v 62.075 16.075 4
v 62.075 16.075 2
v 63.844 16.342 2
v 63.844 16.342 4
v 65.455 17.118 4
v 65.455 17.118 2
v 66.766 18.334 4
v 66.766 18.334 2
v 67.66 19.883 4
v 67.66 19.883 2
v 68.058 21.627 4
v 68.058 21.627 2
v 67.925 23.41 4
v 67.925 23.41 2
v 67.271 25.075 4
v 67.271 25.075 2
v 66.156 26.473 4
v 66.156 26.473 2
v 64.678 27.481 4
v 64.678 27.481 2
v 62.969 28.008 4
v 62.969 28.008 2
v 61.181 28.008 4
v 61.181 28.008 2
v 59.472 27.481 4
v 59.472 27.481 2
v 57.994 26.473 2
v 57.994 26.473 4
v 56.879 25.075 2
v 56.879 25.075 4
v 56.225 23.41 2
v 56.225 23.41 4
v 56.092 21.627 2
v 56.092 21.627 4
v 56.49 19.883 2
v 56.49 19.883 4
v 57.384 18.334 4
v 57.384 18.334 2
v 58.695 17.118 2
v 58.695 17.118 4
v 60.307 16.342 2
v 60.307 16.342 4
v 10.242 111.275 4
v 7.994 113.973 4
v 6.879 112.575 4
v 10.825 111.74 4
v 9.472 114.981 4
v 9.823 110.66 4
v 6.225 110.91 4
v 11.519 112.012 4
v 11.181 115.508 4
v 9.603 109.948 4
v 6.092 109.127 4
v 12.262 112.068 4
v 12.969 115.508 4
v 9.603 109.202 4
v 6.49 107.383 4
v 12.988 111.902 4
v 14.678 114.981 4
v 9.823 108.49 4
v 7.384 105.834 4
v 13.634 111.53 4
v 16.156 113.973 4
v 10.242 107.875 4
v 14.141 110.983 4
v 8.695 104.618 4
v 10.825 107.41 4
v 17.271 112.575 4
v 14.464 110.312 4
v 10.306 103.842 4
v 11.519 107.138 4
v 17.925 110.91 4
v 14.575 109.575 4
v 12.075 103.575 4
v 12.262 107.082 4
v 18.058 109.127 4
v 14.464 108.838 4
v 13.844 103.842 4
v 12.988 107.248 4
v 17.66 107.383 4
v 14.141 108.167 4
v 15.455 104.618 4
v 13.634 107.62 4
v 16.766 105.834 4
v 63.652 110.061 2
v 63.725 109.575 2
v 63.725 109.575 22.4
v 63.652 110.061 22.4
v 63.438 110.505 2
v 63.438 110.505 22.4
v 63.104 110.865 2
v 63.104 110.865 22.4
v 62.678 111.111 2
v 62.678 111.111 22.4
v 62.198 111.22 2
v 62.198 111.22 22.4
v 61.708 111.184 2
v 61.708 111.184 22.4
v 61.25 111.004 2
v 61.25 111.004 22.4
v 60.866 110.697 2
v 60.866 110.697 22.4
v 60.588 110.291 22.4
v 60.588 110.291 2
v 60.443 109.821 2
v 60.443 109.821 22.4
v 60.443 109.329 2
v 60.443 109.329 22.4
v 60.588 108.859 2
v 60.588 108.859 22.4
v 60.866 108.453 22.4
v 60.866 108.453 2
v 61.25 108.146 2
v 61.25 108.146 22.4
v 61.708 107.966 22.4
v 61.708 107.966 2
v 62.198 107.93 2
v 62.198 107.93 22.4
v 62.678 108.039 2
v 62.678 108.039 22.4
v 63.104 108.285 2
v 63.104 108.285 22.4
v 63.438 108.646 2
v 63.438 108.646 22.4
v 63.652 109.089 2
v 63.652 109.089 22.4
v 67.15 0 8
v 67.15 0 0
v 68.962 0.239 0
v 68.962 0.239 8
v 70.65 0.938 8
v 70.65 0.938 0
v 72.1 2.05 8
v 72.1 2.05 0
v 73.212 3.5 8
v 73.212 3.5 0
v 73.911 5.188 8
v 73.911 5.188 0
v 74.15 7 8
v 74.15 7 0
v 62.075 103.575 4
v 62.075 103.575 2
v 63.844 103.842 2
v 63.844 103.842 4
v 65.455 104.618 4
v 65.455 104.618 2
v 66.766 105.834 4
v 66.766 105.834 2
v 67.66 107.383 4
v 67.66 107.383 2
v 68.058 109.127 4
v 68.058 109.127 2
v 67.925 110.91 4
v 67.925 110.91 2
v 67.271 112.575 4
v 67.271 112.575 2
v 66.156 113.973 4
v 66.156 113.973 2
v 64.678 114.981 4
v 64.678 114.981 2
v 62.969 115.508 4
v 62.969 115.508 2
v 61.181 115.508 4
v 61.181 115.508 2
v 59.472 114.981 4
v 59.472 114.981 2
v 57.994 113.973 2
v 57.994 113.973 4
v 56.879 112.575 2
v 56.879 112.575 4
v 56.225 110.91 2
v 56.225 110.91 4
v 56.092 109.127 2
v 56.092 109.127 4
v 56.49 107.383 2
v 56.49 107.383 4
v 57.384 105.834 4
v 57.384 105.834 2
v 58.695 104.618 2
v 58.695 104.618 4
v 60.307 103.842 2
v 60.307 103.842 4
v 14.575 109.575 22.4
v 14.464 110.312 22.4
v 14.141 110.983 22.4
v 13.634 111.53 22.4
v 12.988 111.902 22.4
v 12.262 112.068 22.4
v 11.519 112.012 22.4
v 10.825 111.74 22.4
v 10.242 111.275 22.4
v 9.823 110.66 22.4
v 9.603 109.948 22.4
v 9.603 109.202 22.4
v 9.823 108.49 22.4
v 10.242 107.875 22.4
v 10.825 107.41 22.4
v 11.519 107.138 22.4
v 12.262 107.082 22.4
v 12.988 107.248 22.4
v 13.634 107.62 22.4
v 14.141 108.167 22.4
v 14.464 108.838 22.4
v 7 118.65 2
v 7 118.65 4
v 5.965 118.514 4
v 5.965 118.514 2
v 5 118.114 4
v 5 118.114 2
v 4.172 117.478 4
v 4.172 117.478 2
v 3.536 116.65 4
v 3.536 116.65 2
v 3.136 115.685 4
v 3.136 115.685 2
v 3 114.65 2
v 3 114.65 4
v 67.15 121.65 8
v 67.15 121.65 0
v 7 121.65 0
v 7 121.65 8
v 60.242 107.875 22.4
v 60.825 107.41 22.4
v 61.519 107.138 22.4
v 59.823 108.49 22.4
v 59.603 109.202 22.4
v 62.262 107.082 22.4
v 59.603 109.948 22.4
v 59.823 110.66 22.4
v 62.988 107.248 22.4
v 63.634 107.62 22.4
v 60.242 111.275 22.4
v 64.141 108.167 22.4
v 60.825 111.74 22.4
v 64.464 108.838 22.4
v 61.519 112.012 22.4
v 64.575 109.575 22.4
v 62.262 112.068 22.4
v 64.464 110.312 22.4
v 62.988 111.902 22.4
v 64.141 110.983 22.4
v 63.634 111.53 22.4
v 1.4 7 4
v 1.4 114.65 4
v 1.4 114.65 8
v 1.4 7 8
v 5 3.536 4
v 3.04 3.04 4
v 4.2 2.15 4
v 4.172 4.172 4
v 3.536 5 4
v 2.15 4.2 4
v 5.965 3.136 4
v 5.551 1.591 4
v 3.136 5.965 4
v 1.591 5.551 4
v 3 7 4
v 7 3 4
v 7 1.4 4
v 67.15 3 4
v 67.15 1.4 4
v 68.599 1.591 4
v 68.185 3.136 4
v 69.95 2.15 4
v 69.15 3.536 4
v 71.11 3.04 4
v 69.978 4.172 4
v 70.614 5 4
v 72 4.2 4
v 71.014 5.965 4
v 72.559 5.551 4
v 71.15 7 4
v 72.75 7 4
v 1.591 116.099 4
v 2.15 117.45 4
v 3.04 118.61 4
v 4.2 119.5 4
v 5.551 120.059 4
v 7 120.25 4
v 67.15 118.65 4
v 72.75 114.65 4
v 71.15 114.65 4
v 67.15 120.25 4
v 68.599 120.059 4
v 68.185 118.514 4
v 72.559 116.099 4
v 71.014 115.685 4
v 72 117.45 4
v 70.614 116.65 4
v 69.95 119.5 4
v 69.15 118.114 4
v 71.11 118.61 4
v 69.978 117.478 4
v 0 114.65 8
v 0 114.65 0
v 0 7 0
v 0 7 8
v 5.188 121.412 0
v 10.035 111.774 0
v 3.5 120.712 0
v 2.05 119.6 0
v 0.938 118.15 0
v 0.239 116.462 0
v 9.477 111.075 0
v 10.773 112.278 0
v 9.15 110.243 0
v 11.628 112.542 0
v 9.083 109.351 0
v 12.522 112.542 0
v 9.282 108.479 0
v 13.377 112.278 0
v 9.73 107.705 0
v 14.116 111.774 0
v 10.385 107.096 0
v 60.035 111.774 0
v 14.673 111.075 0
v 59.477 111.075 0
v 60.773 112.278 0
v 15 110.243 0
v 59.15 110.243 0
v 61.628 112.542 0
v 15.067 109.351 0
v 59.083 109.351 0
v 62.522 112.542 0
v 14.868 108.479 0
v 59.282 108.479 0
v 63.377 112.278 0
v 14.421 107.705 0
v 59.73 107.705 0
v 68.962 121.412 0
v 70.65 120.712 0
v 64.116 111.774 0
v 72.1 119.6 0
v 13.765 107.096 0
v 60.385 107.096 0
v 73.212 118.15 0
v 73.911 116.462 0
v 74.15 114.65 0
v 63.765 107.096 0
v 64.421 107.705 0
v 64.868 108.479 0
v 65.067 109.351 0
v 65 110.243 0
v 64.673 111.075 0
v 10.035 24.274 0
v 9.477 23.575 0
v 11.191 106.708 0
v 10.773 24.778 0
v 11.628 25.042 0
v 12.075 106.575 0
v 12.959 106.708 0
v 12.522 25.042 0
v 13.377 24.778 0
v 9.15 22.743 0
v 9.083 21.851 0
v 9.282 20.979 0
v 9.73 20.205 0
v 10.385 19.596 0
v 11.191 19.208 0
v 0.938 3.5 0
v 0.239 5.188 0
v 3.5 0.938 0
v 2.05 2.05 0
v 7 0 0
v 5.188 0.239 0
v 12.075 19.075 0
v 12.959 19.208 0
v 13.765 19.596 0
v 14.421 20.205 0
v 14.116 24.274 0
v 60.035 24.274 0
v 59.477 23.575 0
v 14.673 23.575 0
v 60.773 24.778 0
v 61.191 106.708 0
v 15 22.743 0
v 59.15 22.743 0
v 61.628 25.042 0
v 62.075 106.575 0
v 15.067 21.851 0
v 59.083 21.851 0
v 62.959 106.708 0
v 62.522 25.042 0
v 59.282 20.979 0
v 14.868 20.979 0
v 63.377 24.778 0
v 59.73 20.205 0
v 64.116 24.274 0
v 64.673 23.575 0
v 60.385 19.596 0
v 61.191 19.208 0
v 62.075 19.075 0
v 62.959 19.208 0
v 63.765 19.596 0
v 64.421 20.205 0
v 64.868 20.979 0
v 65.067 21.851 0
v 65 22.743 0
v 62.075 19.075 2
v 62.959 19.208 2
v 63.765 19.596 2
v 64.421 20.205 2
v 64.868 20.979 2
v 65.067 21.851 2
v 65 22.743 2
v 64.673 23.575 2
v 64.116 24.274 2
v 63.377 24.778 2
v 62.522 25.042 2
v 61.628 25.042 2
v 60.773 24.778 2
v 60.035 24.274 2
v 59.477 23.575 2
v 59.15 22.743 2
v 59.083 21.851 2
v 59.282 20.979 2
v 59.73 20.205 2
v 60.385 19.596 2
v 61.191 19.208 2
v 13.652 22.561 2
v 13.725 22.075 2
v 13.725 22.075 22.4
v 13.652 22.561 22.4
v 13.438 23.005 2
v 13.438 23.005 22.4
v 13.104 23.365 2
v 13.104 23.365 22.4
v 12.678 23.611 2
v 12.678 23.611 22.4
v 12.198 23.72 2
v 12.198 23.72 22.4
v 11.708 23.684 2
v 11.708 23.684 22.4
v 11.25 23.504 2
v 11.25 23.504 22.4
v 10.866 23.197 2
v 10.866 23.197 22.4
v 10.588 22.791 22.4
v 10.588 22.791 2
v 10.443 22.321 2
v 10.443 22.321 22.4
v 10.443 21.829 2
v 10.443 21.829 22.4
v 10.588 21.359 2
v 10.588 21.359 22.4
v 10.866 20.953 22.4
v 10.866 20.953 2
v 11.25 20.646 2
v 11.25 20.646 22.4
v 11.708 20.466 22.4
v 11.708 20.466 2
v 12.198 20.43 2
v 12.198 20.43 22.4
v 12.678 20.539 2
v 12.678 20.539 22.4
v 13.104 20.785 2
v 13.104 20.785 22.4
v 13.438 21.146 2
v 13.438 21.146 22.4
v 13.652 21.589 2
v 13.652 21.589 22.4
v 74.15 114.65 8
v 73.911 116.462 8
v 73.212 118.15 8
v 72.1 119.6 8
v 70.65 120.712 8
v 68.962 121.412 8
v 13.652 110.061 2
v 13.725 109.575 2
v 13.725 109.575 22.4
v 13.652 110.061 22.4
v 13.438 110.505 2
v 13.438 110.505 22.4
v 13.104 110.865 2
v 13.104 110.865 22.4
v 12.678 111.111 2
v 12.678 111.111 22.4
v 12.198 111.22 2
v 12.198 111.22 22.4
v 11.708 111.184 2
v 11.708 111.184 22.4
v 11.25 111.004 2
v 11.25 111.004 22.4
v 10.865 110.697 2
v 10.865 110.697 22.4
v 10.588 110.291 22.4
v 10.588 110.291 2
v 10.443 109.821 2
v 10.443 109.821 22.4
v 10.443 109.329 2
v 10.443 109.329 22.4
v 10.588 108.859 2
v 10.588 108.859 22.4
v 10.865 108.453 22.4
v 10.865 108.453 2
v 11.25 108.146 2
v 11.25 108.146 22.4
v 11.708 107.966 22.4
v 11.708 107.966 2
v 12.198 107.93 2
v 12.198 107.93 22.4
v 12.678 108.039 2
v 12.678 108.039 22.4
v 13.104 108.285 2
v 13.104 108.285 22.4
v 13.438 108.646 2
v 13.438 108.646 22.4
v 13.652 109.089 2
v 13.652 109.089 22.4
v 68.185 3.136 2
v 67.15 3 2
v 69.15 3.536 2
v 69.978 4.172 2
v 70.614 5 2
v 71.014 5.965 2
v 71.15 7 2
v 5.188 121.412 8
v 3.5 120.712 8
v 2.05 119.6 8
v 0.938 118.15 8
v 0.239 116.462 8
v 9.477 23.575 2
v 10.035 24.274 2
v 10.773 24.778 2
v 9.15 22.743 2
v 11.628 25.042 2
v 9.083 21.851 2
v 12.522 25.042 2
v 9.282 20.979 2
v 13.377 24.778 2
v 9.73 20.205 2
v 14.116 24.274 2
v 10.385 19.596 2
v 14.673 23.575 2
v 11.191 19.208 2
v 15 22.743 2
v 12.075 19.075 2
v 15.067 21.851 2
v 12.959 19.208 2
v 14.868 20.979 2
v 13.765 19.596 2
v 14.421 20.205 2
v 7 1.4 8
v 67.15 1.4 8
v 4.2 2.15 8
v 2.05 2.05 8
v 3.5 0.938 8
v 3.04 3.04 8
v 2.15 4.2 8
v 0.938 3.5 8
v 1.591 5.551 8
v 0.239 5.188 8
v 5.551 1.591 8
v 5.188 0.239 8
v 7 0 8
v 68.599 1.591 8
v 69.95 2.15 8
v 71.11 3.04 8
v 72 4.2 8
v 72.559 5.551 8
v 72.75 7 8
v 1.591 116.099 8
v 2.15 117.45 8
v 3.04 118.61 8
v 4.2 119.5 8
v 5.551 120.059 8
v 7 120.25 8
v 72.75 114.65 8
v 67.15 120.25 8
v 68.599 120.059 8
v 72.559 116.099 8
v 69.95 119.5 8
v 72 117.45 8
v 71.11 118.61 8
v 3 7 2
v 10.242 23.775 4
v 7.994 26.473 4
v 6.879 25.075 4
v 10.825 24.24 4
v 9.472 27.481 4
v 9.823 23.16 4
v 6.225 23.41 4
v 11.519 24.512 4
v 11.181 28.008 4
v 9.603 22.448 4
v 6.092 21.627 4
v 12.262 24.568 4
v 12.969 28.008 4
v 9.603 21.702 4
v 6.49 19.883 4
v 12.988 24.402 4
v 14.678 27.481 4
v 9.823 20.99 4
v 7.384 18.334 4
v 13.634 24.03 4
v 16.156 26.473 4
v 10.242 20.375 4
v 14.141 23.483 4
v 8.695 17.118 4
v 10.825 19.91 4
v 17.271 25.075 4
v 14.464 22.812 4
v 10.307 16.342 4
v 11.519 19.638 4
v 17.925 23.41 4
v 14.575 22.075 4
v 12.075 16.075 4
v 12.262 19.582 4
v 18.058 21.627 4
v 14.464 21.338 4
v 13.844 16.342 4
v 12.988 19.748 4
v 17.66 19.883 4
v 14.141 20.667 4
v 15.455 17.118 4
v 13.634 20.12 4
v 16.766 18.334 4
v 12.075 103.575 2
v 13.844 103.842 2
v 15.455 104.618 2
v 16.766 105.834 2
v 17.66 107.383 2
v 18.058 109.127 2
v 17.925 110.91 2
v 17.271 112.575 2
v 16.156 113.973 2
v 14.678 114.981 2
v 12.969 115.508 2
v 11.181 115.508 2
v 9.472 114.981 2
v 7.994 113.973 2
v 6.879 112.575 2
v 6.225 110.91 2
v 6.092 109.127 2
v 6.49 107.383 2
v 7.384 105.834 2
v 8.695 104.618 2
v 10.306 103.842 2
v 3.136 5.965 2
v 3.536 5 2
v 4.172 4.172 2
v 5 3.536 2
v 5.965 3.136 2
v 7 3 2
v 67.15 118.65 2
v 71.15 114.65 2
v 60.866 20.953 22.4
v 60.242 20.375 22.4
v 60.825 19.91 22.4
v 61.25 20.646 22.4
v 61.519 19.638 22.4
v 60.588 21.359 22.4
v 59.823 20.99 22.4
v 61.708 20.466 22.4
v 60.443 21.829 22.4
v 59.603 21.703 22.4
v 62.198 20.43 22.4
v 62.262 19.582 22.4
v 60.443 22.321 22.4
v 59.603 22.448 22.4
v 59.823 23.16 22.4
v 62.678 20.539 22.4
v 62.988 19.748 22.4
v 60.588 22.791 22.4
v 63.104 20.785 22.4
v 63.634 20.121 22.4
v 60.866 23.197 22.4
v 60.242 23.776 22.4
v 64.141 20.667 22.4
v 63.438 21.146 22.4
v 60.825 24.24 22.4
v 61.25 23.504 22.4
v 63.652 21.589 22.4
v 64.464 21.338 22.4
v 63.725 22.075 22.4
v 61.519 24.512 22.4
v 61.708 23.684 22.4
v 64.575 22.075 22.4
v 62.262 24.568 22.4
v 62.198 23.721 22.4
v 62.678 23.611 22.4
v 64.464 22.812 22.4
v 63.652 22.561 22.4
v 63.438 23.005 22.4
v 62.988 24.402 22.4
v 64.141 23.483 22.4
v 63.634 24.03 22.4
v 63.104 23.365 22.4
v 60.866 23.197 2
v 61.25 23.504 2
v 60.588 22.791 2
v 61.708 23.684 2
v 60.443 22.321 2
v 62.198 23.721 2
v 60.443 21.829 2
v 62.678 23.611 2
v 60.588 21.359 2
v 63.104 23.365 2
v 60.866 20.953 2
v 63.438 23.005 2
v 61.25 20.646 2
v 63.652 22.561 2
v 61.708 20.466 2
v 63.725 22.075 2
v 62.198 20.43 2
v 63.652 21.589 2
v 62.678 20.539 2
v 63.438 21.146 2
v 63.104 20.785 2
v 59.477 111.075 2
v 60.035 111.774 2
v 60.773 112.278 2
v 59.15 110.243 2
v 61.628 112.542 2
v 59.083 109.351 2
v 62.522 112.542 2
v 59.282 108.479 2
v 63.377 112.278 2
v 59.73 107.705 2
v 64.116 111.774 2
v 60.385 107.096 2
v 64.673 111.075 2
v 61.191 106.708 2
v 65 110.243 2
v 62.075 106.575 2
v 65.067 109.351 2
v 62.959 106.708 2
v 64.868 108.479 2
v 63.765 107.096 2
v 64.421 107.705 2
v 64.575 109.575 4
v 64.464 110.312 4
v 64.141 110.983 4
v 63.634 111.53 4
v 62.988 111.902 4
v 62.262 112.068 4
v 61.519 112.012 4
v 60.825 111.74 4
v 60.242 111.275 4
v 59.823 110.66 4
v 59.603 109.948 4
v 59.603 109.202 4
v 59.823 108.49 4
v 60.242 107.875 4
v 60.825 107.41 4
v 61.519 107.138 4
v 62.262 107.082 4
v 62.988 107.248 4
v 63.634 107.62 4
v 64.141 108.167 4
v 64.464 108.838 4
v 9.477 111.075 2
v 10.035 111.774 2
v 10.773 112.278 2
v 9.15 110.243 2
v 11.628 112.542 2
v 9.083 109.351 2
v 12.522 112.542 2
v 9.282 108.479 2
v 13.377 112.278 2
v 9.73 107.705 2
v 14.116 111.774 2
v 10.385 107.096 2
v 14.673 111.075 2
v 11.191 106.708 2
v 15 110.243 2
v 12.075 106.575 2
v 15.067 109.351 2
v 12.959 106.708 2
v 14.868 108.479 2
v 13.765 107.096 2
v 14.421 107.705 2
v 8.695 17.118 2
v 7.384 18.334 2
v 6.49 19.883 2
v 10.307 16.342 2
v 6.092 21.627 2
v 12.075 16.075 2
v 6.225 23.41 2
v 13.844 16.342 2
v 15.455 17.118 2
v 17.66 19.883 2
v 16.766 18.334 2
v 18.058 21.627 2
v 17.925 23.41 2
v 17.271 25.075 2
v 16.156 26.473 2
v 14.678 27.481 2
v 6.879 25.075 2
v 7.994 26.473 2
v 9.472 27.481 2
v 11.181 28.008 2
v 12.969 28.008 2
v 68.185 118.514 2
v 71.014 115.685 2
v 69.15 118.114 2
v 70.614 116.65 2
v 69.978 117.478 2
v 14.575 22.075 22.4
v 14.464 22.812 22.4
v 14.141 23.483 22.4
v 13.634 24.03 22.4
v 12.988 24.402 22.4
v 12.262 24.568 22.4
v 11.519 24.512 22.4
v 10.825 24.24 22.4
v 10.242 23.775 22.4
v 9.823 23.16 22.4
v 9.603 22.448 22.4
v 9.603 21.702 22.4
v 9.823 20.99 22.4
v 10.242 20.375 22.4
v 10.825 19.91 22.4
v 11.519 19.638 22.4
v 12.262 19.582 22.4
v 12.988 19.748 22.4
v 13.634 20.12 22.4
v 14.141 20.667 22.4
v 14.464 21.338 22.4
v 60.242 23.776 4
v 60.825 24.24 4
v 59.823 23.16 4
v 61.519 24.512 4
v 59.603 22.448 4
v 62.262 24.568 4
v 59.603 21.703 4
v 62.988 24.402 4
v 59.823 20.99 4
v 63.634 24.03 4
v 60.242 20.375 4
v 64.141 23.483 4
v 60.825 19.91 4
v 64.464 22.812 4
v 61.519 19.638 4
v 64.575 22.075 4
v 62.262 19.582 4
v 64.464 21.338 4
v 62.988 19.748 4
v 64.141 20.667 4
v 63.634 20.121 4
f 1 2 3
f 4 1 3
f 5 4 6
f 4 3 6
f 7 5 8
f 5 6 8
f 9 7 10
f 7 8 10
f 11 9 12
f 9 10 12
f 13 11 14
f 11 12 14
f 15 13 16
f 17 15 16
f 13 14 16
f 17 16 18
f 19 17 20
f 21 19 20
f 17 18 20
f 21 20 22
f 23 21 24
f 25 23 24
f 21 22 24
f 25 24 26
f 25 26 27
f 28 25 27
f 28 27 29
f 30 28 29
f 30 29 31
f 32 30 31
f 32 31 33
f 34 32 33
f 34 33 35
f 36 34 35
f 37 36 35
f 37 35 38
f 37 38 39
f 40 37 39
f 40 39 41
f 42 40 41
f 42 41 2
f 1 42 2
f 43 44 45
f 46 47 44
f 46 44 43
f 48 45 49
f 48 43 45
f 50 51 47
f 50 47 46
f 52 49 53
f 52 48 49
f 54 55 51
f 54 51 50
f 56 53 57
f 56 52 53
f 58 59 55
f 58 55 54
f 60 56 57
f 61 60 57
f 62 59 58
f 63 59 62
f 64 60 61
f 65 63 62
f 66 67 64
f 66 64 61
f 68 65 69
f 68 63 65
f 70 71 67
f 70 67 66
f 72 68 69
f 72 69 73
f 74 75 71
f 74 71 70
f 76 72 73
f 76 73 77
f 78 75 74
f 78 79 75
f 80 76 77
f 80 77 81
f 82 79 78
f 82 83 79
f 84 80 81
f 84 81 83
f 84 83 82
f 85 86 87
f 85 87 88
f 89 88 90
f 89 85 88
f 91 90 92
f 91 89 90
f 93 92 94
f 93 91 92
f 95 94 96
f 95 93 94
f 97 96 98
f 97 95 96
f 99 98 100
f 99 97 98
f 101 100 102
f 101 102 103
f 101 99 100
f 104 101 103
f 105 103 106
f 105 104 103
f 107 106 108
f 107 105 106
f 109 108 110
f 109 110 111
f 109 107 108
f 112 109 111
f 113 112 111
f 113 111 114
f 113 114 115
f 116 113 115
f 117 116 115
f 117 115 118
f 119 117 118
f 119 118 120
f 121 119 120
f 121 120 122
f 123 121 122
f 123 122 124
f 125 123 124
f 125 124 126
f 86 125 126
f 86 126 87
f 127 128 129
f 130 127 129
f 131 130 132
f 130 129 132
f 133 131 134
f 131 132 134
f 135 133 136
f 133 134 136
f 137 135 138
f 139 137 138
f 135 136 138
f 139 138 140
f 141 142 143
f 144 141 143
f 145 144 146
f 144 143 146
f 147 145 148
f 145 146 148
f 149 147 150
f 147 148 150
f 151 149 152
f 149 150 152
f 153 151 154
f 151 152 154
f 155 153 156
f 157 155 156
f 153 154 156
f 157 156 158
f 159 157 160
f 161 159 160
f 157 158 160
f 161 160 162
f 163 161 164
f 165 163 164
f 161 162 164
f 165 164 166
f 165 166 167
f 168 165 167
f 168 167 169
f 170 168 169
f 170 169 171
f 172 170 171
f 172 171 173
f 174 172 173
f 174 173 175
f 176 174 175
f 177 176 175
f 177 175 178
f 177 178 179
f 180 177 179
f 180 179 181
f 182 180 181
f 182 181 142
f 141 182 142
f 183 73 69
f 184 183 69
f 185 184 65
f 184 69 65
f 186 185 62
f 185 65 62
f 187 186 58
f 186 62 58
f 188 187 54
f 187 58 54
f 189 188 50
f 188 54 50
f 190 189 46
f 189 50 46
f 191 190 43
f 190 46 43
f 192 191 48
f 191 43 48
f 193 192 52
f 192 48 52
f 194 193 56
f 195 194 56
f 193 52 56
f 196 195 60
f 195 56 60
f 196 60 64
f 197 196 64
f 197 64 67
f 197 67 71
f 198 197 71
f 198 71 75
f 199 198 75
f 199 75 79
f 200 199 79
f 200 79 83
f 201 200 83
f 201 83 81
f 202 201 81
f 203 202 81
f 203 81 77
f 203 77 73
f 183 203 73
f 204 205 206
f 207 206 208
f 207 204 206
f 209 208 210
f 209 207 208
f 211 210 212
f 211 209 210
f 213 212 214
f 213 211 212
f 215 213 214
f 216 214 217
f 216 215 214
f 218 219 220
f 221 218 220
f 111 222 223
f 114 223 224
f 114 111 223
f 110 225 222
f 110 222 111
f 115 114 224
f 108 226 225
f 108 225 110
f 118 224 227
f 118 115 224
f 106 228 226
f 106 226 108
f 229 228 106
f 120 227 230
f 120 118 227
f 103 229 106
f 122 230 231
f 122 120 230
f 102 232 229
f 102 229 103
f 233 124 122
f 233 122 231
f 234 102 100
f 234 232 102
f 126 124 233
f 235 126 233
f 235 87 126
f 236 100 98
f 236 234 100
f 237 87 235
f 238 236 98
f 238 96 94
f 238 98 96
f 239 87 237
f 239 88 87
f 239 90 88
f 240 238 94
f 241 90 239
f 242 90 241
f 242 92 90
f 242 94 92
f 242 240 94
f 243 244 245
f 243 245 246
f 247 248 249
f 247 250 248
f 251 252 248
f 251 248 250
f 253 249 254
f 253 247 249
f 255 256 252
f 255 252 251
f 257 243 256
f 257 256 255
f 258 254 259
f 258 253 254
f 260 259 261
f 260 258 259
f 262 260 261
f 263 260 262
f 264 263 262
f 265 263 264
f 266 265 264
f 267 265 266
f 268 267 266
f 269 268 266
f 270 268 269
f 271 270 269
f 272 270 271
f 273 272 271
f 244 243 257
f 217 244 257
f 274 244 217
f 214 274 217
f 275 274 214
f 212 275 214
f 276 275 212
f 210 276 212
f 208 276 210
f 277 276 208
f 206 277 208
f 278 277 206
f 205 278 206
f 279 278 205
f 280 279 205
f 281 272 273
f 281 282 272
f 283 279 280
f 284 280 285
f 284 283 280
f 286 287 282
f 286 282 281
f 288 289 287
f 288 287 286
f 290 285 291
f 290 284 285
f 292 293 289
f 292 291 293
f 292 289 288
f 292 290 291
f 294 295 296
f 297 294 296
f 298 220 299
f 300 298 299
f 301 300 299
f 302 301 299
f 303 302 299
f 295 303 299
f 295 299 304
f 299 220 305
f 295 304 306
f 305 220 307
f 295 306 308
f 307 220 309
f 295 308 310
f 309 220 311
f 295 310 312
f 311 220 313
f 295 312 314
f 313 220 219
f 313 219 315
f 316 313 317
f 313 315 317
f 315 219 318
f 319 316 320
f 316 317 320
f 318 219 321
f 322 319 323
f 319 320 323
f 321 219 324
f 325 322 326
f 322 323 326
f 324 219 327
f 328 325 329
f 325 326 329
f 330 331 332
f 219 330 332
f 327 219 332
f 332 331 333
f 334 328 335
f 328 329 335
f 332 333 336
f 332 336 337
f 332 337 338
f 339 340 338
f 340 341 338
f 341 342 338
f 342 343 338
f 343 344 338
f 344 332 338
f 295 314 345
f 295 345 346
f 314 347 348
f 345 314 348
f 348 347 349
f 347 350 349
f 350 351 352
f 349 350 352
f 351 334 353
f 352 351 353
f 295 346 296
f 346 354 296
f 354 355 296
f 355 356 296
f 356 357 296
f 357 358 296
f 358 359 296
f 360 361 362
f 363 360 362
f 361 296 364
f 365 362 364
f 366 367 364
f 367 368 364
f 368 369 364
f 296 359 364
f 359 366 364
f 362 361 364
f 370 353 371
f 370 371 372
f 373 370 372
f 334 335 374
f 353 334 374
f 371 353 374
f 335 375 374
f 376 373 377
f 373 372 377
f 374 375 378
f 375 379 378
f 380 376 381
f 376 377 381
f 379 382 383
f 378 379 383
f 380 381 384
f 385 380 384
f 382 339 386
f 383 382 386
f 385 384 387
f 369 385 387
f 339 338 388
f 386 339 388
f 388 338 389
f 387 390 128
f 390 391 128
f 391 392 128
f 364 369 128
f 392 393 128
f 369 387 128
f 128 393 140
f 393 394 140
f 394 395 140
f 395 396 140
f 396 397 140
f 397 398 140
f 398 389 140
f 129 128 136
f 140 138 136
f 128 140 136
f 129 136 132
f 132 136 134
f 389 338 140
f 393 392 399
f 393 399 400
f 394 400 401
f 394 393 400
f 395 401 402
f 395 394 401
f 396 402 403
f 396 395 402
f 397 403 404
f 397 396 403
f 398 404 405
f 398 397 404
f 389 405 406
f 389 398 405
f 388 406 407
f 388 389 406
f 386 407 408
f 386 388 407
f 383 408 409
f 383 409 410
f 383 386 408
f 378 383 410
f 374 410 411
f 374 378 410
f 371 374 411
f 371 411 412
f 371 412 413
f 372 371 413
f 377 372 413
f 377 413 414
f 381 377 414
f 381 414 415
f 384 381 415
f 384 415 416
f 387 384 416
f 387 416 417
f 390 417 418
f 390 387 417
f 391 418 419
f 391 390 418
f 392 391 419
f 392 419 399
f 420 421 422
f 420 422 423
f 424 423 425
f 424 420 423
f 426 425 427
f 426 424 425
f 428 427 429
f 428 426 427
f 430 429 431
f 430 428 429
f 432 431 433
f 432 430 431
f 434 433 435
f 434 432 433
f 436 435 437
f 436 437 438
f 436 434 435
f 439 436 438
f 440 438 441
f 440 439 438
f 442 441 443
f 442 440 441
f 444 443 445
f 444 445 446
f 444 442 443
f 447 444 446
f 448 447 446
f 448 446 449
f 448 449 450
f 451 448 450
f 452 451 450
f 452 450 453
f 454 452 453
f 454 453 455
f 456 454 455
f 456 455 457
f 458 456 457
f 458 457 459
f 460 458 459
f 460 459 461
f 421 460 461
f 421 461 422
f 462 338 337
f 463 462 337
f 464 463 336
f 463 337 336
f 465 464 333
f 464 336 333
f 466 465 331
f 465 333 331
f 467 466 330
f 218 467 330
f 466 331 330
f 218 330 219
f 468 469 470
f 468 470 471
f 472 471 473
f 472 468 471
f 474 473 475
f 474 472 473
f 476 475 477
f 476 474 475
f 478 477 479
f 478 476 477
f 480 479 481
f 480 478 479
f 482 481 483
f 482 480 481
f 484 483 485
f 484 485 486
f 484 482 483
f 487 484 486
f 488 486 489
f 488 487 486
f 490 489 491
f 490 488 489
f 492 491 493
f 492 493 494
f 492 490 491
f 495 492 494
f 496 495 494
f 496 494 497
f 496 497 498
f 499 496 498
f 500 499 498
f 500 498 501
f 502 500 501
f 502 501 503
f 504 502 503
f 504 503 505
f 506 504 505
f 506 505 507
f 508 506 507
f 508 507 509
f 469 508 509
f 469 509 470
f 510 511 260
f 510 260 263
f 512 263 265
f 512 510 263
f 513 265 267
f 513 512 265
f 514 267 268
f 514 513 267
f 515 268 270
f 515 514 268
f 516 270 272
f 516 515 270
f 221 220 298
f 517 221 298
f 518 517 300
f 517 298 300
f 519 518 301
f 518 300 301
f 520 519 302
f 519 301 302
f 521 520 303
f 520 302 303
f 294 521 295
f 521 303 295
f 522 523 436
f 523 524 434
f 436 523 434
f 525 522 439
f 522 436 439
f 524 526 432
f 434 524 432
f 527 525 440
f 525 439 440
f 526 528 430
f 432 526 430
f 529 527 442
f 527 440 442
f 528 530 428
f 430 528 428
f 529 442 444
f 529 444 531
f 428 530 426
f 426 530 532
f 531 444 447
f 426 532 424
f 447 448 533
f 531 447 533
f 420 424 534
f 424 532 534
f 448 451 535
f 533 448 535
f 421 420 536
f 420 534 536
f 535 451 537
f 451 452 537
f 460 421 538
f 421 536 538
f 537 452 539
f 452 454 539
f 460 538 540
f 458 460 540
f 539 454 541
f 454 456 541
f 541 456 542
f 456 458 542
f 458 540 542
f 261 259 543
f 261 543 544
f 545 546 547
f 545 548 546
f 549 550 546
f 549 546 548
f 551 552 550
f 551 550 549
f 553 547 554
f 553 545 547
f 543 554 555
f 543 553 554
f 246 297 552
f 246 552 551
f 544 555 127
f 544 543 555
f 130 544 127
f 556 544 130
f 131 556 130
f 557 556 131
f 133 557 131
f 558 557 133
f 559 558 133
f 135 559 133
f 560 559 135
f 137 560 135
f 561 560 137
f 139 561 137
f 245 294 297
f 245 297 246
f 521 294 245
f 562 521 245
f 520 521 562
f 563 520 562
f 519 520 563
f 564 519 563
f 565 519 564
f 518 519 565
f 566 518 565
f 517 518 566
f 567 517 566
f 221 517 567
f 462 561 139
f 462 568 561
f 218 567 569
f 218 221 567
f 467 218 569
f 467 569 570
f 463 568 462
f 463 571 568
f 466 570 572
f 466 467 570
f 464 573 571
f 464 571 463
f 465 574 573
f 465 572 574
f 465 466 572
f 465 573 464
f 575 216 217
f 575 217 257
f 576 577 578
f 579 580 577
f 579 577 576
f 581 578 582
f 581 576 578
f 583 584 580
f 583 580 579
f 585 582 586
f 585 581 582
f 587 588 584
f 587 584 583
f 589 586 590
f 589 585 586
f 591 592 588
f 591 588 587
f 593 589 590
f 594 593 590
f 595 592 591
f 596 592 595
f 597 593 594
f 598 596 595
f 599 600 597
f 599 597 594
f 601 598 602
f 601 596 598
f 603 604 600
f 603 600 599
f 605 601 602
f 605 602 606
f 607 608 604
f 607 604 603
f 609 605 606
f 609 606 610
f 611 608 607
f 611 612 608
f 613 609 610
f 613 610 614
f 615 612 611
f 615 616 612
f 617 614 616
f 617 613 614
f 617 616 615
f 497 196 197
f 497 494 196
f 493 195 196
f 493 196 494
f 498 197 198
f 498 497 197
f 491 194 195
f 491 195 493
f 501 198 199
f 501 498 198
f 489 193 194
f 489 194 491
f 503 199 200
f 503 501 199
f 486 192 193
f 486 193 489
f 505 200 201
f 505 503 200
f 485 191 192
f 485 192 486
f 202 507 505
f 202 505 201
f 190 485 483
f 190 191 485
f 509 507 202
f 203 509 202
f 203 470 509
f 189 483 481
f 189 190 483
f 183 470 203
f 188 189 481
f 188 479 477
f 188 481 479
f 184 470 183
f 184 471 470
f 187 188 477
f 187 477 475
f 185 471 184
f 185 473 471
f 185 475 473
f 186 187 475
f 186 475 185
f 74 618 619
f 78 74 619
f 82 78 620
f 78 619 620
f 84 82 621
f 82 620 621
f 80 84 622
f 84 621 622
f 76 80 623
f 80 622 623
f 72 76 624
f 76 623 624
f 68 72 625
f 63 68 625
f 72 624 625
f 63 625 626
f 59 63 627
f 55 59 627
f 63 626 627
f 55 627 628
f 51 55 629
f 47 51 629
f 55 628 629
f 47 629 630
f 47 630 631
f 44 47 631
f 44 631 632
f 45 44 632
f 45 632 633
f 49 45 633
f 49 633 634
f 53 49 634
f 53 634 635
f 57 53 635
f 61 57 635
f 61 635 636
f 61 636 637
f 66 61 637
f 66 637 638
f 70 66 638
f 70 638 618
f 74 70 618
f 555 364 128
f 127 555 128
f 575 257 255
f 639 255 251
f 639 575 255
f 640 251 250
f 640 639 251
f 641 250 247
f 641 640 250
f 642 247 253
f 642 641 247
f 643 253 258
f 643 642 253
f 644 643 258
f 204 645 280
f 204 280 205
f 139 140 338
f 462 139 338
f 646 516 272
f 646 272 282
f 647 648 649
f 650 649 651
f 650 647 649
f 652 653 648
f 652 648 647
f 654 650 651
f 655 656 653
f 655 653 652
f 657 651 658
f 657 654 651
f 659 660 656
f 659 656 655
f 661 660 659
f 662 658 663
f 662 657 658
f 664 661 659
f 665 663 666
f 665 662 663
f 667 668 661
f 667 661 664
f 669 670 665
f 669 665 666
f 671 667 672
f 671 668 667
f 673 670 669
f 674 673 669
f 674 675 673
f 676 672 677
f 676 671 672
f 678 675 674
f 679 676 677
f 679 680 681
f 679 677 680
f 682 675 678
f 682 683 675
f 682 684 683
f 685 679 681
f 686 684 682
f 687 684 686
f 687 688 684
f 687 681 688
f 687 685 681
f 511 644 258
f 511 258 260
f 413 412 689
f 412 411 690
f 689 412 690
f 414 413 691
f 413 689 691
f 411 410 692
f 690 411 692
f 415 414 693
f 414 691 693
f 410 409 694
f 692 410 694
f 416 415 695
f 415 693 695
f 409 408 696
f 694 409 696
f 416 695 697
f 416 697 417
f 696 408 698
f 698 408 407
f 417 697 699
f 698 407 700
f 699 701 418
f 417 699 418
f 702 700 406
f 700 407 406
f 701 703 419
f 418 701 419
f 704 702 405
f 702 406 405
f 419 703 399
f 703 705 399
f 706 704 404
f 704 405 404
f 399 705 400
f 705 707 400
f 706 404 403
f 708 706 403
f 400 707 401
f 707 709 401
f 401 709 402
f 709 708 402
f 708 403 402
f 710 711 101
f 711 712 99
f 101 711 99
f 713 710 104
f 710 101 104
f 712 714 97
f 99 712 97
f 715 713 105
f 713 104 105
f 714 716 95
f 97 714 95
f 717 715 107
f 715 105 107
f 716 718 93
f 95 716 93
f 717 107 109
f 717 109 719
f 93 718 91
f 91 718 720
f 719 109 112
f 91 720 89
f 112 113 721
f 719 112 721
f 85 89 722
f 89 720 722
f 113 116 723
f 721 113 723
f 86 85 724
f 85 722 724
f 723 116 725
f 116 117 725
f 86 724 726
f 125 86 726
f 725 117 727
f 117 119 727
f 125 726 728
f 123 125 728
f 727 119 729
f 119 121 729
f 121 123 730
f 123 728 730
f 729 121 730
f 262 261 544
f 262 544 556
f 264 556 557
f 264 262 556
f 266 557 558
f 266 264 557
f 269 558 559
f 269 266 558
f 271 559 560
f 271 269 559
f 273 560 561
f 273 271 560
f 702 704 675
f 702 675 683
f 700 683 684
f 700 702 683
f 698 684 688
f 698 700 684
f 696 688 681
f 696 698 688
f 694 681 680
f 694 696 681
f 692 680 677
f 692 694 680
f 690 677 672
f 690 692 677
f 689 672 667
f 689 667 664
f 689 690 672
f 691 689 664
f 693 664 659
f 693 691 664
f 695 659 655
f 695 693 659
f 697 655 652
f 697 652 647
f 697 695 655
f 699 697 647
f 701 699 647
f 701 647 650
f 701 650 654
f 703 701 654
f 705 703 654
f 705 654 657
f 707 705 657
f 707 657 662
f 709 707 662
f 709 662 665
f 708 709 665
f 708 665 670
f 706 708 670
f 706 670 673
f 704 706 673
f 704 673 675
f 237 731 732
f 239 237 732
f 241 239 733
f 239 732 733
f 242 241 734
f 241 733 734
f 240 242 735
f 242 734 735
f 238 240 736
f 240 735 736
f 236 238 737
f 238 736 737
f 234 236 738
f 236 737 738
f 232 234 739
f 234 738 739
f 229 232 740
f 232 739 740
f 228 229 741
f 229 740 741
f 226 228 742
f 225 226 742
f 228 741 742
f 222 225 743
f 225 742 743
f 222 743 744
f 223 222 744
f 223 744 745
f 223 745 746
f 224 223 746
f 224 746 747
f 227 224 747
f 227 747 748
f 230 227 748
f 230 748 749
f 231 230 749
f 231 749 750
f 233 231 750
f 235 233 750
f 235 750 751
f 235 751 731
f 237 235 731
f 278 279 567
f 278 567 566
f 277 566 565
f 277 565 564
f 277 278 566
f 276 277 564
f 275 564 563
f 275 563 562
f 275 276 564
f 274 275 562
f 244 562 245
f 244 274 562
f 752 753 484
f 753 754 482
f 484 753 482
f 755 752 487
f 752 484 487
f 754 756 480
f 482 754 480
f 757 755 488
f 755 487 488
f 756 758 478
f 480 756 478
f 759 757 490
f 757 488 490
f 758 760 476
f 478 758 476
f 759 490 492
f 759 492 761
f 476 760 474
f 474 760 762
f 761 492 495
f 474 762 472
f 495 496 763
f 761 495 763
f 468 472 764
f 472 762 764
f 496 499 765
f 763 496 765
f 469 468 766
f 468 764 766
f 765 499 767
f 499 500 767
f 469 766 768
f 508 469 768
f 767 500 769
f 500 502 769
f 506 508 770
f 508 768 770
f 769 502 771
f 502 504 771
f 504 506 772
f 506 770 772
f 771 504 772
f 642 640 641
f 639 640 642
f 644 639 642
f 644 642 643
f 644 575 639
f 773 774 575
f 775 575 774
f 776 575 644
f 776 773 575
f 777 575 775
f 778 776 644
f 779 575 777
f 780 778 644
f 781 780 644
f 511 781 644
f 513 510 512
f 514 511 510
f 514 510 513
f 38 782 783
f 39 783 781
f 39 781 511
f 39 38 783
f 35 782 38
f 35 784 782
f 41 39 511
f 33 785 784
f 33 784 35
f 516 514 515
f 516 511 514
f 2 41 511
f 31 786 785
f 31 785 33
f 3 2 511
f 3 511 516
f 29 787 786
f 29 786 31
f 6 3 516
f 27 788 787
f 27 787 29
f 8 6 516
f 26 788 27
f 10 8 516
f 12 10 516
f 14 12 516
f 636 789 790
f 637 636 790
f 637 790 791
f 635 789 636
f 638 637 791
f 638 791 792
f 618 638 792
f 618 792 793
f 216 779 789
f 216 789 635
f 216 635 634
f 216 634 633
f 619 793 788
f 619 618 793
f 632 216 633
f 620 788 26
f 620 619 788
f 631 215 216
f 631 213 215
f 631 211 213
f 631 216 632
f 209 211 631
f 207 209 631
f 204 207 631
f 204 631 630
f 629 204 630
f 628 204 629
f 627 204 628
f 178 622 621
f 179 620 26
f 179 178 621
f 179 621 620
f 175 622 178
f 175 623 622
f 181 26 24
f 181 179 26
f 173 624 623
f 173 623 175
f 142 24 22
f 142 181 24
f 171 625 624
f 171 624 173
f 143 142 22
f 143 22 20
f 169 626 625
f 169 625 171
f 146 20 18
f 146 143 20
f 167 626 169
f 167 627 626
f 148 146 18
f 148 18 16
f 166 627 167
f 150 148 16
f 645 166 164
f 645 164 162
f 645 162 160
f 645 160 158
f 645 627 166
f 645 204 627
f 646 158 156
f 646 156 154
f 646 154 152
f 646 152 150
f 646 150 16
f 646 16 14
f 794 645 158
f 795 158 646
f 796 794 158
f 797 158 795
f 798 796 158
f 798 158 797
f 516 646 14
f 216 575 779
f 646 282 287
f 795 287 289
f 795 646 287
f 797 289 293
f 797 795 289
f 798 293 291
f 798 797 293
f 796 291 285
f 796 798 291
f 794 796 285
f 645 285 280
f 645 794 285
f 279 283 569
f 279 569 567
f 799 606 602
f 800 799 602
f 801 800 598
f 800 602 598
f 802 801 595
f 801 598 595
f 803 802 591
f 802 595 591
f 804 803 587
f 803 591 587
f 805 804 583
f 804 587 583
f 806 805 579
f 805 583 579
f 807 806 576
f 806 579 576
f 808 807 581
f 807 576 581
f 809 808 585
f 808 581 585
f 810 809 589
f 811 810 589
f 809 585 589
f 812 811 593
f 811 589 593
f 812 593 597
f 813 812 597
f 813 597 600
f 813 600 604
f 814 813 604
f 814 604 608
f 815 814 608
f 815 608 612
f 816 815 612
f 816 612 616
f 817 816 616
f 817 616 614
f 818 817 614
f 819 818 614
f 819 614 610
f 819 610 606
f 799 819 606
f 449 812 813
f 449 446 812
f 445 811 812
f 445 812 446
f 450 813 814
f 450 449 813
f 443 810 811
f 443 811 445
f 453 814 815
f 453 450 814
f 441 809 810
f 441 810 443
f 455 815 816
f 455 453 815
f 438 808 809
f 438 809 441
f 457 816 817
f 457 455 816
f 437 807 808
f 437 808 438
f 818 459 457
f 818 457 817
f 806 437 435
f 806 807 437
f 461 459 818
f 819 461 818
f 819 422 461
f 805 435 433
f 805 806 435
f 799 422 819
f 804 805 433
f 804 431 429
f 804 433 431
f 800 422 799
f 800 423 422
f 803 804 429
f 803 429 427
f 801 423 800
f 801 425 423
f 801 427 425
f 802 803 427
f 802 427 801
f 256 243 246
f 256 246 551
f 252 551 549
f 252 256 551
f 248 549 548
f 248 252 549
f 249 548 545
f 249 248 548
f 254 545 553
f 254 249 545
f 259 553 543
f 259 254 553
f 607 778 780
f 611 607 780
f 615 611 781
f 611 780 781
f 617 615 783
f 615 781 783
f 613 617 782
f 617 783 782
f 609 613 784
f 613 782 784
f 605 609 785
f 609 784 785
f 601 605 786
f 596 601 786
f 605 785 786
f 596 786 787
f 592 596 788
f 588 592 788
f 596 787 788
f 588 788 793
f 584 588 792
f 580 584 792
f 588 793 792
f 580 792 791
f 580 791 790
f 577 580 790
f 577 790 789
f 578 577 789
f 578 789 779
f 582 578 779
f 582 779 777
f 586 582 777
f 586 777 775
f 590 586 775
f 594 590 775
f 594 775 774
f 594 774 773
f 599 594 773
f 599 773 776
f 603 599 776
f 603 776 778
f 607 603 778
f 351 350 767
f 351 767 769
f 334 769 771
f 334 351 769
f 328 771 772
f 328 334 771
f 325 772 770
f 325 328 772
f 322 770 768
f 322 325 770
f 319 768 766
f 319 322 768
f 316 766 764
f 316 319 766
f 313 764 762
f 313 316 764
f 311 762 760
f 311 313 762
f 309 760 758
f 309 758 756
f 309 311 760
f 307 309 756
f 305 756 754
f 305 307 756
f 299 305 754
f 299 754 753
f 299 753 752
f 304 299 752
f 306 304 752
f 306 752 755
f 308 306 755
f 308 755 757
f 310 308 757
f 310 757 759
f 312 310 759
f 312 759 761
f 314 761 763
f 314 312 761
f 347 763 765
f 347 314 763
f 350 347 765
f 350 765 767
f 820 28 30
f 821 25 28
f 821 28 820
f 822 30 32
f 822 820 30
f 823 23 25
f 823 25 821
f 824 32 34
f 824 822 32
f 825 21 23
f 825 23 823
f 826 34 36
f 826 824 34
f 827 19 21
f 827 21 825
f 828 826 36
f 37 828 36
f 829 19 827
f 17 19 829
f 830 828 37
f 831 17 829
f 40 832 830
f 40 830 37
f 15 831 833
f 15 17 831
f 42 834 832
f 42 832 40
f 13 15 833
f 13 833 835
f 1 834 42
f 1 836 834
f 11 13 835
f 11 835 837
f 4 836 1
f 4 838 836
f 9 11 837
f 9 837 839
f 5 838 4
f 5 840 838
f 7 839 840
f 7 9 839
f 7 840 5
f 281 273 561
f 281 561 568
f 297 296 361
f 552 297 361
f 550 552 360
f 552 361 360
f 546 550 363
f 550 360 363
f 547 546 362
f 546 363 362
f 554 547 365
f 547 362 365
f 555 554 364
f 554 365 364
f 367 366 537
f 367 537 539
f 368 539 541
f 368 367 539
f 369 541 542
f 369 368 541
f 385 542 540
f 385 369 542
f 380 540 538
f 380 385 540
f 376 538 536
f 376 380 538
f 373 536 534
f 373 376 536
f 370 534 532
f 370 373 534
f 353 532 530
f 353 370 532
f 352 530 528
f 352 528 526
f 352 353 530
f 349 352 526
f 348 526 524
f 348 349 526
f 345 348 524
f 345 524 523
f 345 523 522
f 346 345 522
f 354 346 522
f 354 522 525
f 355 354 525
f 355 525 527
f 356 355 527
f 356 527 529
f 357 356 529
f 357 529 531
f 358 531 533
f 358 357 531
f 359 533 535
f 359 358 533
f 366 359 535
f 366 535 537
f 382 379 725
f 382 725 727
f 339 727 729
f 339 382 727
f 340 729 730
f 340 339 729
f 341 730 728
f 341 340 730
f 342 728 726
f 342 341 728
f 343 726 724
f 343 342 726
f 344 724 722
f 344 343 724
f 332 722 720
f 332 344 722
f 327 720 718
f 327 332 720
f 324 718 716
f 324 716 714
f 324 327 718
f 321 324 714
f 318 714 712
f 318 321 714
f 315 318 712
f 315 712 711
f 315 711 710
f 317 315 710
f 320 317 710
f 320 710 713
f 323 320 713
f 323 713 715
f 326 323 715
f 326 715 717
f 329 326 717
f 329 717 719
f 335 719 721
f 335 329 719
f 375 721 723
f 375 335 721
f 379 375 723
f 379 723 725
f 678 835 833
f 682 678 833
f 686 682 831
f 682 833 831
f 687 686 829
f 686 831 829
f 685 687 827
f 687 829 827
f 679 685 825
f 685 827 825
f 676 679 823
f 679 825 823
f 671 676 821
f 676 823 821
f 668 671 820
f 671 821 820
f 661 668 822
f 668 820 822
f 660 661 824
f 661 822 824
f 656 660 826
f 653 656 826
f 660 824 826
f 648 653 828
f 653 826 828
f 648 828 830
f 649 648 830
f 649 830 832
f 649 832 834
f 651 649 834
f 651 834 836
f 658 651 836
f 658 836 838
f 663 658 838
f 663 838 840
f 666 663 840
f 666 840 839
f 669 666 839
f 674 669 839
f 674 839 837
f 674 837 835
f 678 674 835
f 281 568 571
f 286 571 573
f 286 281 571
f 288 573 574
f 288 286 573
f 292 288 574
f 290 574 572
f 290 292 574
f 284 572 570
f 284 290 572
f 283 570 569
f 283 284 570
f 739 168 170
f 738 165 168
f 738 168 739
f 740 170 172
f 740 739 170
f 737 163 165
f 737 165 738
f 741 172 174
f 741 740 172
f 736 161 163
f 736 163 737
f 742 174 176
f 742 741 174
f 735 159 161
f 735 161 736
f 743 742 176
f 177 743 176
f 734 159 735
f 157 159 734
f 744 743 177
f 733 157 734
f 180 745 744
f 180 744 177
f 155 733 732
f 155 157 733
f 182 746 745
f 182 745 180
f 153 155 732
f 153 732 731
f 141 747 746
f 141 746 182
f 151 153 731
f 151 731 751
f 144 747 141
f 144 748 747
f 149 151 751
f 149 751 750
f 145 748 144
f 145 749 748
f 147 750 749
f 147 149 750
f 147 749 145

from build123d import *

# Parameters (mm, degrees)
PAD_DEPTH         = 2
PAD001_DEPTH      = 4
PAD002_DEPTH      = 8
SKETCH002_R       = 2.5
PAD003_DEPTH      = 22.4
CYLINDER_R        = 6
CYLINDER_DEPTH    = 4
CYLINDER001_R     = 6
CYLINDER001_DEPTH = 4
CYLINDER002_R     = 6
CYLINDER002_DEPTH = 4
CYLINDER003_R     = 6
CYLINDER003_DEPTH = 4
CYLINDER004_R     = 3
CYLINDER004_DEPTH = 2
CYLINDER005_R     = 3
CYLINDER005_DEPTH = 2
CYLINDER006_R     = 3
CYLINDER006_DEPTH = 2
CYLINDER007_R     = 3
CYLINDER007_DEPTH = 2
SKETCH003_R       = 1.65
POCKET_DEPTH      = 22.4


with BuildPart() as part:
    # Sketch004 → Pad (new body)
    with BuildSketch(Plane.XY):
        with BuildLine():
            Line((74.149994, 7), (74.149994, 114.650046))
            ThreePointArc((74.149994, 114.650046), (72.099741, 119.599793), (67.149994, 121.650046))
            Line((67.149994, 121.650046), (7, 121.650046))
            ThreePointArc((7, 121.650046), (2.050253, 119.599793), (0, 114.650046))
            Line((0, 114.650046), (0, 7))
            ThreePointArc((0, 7), (2.050253, 2.050253), (7, 0))
            Line((7, 0), (67.149994, 0))
            ThreePointArc((67.149994, 0), (72.099741, 2.050253), (74.149994, 7))
        make_face()
    extrude(amount=PAD_DEPTH)

    # Sketch001 → Pad001 (join)
    with BuildSketch(Plane.XY):
        with BuildLine():
            Line((74.149994, 7), (74.149994, 114.650046))
            ThreePointArc((74.149994, 114.650046), (72.099741, 119.599793), (67.149994, 121.650046))
            Line((67.149994, 121.650046), (7, 121.650046))
            ThreePointArc((7, 121.650046), (2.050253, 119.599793), (0, 114.650046))
            Line((0, 114.650046), (0, 7))
            ThreePointArc((0, 7), (2.050253, 2.050253), (7, 0))
            Line((7, 0), (67.149994, 0))
            ThreePointArc((67.149994, 0), (72.099741, 2.050253), (74.149994, 7))
        make_face()
        with BuildLine():
            Line((7, 3), (67.149994, 3))
            ThreePointArc((67.149994, 3), (69.978421, 4.171573), (71.149994, 7))
            Line((71.149994, 7), (71.149994, 114.650046))
            ThreePointArc((71.149994, 114.650046), (69.978421, 117.478473), (67.149994, 118.650046))
            Line((67.149994, 118.650046), (7, 118.650046))
            ThreePointArc((7, 118.650046), (4.171573, 117.478473), (3, 114.650046))
            Line((3, 114.650046), (3, 7))
            ThreePointArc((3, 7), (4.171573, 4.171573), (7, 3))
        make_face(mode=Mode.SUBTRACT)
    extrude(amount=PAD001_DEPTH)

    # Sketch → Pad002 (join)
    with BuildSketch(Plane.XY):
        with BuildLine():
            Line((74.149994, 7), (74.149994, 114.650046))
            ThreePointArc((74.149994, 114.650046), (72.099741, 119.599793), (67.149994, 121.650046))
            Line((67.149994, 121.650046), (7, 121.650046))
            ThreePointArc((7, 121.650046), (2.050253, 119.599793), (0, 114.650046))
            Line((0, 114.650046), (0, 7))
            ThreePointArc((0, 7), (2.050253, 2.050253), (7, 0))
            Line((7, 0), (67.149994, 0))
            ThreePointArc((67.149994, 0), (72.099741, 2.050253), (74.149994, 7))
        make_face()
        with BuildLine():
            Line((7, 1.4), (67.149994, 1.4))
            ThreePointArc((67.149994, 1.4), (71.109792, 3.040202), (72.749994, 7))
            Line((72.749994, 7), (72.749994, 114.650046))
            ThreePointArc((72.749994, 114.650046), (71.109792, 118.609844), (67.149994, 120.250046))
            Line((67.149994, 120.250046), (7, 120.250046))
            ThreePointArc((7, 120.250046), (3.040202, 118.609844), (1.4, 114.650046))
            Line((1.4, 114.650046), (1.4, 7))
            ThreePointArc((1.4, 7), (3.040202, 3.040202), (7, 1.4))
        make_face(mode=Mode.SUBTRACT)
    extrude(amount=PAD002_DEPTH)

    # Sketch002 → Pad003 (join)
    with BuildSketch(Plane.XY):
        with Locations((12.075062, 22.075062)):
            Circle(SKETCH002_R)
        with Locations((12.075024, 109.57503)):
            Circle(SKETCH002_R)
        with Locations((62.075044, 109.575056)):
            Circle(SKETCH002_R)
        with Locations((62.075039, 22.075116)):
            Circle(SKETCH002_R)
    extrude(amount=PAD003_DEPTH)

    # Cylinder → Cylinder (join)
    with BuildSketch(Plane(origin=(12.075062, 22.075062, 0), x_dir=(0, -1, 0), z_dir=(0, 0, 1))):
        Circle(CYLINDER_R)
    extrude(amount=CYLINDER_DEPTH)

    # Cylinder001 → Cylinder001 (join)
    with BuildSketch(Plane(origin=(62.075039, 22.075116, 0), x_dir=(0, -1, 0), z_dir=(0, 0, 1))):
        Circle(CYLINDER001_R)
    extrude(amount=CYLINDER001_DEPTH)

    # Cylinder002 → Cylinder002 (join)
    with BuildSketch(Plane(origin=(62.075044, 109.575056, 0), x_dir=(0, -1, 0), z_dir=(0, 0, 1))):
        Circle(CYLINDER002_R)
    extrude(amount=CYLINDER002_DEPTH)

    # Cylinder003 → Cylinder003 (join)
    with BuildSketch(Plane(origin=(12.075024, 109.57503, 0), x_dir=(0, -1, 0), z_dir=(0, 0, 1))):
        Circle(CYLINDER003_R)
    extrude(amount=CYLINDER003_DEPTH)

    # Cylinder004 → Cylinder004 (cut)
    with BuildSketch(Plane(origin=(12.075062, 22.075062, 0), x_dir=(0, -1, 0), z_dir=(0, 0, 1))):
        Circle(CYLINDER004_R)
    extrude(amount=CYLINDER004_DEPTH, mode=Mode.SUBTRACT)

    # Cylinder005 → Cylinder005 (cut)
    with BuildSketch(Plane(origin=(62.075039, 22.075116, 0), x_dir=(0, -1, 0), z_dir=(0, 0, 1))):
        Circle(CYLINDER005_R)
    extrude(amount=CYLINDER005_DEPTH, mode=Mode.SUBTRACT)

    # Cylinder006 → Cylinder006 (cut)
    with BuildSketch(Plane(origin=(12.075024, 109.57503, 0), x_dir=(0, -1, 0), z_dir=(0, 0, 1))):
        Circle(CYLINDER006_R)
    extrude(amount=CYLINDER006_DEPTH, mode=Mode.SUBTRACT)

    # Cylinder007 → Cylinder007 (cut)
    with BuildSketch(Plane(origin=(62.075044, 109.575056, 0), x_dir=(0, -1, 0), z_dir=(0, 0, 1))):
        Circle(CYLINDER007_R)
    extrude(amount=CYLINDER007_DEPTH, mode=Mode.SUBTRACT)

    # Sketch003 → Pocket (cut)
    with BuildSketch(Plane.XY):
        with Locations((12.075062, 22.075062)):
            Circle(SKETCH003_R)
        with Locations((12.075024, 109.57503)):
            Circle(SKETCH003_R)
        with Locations((62.075044, 109.575056)):
            Circle(SKETCH003_R)
        with Locations((62.075039, 22.075116)):
            Circle(SKETCH003_R)
    extrude(amount=POCKET_DEPTH, mode=Mode.SUBTRACT)


solid = part.part
